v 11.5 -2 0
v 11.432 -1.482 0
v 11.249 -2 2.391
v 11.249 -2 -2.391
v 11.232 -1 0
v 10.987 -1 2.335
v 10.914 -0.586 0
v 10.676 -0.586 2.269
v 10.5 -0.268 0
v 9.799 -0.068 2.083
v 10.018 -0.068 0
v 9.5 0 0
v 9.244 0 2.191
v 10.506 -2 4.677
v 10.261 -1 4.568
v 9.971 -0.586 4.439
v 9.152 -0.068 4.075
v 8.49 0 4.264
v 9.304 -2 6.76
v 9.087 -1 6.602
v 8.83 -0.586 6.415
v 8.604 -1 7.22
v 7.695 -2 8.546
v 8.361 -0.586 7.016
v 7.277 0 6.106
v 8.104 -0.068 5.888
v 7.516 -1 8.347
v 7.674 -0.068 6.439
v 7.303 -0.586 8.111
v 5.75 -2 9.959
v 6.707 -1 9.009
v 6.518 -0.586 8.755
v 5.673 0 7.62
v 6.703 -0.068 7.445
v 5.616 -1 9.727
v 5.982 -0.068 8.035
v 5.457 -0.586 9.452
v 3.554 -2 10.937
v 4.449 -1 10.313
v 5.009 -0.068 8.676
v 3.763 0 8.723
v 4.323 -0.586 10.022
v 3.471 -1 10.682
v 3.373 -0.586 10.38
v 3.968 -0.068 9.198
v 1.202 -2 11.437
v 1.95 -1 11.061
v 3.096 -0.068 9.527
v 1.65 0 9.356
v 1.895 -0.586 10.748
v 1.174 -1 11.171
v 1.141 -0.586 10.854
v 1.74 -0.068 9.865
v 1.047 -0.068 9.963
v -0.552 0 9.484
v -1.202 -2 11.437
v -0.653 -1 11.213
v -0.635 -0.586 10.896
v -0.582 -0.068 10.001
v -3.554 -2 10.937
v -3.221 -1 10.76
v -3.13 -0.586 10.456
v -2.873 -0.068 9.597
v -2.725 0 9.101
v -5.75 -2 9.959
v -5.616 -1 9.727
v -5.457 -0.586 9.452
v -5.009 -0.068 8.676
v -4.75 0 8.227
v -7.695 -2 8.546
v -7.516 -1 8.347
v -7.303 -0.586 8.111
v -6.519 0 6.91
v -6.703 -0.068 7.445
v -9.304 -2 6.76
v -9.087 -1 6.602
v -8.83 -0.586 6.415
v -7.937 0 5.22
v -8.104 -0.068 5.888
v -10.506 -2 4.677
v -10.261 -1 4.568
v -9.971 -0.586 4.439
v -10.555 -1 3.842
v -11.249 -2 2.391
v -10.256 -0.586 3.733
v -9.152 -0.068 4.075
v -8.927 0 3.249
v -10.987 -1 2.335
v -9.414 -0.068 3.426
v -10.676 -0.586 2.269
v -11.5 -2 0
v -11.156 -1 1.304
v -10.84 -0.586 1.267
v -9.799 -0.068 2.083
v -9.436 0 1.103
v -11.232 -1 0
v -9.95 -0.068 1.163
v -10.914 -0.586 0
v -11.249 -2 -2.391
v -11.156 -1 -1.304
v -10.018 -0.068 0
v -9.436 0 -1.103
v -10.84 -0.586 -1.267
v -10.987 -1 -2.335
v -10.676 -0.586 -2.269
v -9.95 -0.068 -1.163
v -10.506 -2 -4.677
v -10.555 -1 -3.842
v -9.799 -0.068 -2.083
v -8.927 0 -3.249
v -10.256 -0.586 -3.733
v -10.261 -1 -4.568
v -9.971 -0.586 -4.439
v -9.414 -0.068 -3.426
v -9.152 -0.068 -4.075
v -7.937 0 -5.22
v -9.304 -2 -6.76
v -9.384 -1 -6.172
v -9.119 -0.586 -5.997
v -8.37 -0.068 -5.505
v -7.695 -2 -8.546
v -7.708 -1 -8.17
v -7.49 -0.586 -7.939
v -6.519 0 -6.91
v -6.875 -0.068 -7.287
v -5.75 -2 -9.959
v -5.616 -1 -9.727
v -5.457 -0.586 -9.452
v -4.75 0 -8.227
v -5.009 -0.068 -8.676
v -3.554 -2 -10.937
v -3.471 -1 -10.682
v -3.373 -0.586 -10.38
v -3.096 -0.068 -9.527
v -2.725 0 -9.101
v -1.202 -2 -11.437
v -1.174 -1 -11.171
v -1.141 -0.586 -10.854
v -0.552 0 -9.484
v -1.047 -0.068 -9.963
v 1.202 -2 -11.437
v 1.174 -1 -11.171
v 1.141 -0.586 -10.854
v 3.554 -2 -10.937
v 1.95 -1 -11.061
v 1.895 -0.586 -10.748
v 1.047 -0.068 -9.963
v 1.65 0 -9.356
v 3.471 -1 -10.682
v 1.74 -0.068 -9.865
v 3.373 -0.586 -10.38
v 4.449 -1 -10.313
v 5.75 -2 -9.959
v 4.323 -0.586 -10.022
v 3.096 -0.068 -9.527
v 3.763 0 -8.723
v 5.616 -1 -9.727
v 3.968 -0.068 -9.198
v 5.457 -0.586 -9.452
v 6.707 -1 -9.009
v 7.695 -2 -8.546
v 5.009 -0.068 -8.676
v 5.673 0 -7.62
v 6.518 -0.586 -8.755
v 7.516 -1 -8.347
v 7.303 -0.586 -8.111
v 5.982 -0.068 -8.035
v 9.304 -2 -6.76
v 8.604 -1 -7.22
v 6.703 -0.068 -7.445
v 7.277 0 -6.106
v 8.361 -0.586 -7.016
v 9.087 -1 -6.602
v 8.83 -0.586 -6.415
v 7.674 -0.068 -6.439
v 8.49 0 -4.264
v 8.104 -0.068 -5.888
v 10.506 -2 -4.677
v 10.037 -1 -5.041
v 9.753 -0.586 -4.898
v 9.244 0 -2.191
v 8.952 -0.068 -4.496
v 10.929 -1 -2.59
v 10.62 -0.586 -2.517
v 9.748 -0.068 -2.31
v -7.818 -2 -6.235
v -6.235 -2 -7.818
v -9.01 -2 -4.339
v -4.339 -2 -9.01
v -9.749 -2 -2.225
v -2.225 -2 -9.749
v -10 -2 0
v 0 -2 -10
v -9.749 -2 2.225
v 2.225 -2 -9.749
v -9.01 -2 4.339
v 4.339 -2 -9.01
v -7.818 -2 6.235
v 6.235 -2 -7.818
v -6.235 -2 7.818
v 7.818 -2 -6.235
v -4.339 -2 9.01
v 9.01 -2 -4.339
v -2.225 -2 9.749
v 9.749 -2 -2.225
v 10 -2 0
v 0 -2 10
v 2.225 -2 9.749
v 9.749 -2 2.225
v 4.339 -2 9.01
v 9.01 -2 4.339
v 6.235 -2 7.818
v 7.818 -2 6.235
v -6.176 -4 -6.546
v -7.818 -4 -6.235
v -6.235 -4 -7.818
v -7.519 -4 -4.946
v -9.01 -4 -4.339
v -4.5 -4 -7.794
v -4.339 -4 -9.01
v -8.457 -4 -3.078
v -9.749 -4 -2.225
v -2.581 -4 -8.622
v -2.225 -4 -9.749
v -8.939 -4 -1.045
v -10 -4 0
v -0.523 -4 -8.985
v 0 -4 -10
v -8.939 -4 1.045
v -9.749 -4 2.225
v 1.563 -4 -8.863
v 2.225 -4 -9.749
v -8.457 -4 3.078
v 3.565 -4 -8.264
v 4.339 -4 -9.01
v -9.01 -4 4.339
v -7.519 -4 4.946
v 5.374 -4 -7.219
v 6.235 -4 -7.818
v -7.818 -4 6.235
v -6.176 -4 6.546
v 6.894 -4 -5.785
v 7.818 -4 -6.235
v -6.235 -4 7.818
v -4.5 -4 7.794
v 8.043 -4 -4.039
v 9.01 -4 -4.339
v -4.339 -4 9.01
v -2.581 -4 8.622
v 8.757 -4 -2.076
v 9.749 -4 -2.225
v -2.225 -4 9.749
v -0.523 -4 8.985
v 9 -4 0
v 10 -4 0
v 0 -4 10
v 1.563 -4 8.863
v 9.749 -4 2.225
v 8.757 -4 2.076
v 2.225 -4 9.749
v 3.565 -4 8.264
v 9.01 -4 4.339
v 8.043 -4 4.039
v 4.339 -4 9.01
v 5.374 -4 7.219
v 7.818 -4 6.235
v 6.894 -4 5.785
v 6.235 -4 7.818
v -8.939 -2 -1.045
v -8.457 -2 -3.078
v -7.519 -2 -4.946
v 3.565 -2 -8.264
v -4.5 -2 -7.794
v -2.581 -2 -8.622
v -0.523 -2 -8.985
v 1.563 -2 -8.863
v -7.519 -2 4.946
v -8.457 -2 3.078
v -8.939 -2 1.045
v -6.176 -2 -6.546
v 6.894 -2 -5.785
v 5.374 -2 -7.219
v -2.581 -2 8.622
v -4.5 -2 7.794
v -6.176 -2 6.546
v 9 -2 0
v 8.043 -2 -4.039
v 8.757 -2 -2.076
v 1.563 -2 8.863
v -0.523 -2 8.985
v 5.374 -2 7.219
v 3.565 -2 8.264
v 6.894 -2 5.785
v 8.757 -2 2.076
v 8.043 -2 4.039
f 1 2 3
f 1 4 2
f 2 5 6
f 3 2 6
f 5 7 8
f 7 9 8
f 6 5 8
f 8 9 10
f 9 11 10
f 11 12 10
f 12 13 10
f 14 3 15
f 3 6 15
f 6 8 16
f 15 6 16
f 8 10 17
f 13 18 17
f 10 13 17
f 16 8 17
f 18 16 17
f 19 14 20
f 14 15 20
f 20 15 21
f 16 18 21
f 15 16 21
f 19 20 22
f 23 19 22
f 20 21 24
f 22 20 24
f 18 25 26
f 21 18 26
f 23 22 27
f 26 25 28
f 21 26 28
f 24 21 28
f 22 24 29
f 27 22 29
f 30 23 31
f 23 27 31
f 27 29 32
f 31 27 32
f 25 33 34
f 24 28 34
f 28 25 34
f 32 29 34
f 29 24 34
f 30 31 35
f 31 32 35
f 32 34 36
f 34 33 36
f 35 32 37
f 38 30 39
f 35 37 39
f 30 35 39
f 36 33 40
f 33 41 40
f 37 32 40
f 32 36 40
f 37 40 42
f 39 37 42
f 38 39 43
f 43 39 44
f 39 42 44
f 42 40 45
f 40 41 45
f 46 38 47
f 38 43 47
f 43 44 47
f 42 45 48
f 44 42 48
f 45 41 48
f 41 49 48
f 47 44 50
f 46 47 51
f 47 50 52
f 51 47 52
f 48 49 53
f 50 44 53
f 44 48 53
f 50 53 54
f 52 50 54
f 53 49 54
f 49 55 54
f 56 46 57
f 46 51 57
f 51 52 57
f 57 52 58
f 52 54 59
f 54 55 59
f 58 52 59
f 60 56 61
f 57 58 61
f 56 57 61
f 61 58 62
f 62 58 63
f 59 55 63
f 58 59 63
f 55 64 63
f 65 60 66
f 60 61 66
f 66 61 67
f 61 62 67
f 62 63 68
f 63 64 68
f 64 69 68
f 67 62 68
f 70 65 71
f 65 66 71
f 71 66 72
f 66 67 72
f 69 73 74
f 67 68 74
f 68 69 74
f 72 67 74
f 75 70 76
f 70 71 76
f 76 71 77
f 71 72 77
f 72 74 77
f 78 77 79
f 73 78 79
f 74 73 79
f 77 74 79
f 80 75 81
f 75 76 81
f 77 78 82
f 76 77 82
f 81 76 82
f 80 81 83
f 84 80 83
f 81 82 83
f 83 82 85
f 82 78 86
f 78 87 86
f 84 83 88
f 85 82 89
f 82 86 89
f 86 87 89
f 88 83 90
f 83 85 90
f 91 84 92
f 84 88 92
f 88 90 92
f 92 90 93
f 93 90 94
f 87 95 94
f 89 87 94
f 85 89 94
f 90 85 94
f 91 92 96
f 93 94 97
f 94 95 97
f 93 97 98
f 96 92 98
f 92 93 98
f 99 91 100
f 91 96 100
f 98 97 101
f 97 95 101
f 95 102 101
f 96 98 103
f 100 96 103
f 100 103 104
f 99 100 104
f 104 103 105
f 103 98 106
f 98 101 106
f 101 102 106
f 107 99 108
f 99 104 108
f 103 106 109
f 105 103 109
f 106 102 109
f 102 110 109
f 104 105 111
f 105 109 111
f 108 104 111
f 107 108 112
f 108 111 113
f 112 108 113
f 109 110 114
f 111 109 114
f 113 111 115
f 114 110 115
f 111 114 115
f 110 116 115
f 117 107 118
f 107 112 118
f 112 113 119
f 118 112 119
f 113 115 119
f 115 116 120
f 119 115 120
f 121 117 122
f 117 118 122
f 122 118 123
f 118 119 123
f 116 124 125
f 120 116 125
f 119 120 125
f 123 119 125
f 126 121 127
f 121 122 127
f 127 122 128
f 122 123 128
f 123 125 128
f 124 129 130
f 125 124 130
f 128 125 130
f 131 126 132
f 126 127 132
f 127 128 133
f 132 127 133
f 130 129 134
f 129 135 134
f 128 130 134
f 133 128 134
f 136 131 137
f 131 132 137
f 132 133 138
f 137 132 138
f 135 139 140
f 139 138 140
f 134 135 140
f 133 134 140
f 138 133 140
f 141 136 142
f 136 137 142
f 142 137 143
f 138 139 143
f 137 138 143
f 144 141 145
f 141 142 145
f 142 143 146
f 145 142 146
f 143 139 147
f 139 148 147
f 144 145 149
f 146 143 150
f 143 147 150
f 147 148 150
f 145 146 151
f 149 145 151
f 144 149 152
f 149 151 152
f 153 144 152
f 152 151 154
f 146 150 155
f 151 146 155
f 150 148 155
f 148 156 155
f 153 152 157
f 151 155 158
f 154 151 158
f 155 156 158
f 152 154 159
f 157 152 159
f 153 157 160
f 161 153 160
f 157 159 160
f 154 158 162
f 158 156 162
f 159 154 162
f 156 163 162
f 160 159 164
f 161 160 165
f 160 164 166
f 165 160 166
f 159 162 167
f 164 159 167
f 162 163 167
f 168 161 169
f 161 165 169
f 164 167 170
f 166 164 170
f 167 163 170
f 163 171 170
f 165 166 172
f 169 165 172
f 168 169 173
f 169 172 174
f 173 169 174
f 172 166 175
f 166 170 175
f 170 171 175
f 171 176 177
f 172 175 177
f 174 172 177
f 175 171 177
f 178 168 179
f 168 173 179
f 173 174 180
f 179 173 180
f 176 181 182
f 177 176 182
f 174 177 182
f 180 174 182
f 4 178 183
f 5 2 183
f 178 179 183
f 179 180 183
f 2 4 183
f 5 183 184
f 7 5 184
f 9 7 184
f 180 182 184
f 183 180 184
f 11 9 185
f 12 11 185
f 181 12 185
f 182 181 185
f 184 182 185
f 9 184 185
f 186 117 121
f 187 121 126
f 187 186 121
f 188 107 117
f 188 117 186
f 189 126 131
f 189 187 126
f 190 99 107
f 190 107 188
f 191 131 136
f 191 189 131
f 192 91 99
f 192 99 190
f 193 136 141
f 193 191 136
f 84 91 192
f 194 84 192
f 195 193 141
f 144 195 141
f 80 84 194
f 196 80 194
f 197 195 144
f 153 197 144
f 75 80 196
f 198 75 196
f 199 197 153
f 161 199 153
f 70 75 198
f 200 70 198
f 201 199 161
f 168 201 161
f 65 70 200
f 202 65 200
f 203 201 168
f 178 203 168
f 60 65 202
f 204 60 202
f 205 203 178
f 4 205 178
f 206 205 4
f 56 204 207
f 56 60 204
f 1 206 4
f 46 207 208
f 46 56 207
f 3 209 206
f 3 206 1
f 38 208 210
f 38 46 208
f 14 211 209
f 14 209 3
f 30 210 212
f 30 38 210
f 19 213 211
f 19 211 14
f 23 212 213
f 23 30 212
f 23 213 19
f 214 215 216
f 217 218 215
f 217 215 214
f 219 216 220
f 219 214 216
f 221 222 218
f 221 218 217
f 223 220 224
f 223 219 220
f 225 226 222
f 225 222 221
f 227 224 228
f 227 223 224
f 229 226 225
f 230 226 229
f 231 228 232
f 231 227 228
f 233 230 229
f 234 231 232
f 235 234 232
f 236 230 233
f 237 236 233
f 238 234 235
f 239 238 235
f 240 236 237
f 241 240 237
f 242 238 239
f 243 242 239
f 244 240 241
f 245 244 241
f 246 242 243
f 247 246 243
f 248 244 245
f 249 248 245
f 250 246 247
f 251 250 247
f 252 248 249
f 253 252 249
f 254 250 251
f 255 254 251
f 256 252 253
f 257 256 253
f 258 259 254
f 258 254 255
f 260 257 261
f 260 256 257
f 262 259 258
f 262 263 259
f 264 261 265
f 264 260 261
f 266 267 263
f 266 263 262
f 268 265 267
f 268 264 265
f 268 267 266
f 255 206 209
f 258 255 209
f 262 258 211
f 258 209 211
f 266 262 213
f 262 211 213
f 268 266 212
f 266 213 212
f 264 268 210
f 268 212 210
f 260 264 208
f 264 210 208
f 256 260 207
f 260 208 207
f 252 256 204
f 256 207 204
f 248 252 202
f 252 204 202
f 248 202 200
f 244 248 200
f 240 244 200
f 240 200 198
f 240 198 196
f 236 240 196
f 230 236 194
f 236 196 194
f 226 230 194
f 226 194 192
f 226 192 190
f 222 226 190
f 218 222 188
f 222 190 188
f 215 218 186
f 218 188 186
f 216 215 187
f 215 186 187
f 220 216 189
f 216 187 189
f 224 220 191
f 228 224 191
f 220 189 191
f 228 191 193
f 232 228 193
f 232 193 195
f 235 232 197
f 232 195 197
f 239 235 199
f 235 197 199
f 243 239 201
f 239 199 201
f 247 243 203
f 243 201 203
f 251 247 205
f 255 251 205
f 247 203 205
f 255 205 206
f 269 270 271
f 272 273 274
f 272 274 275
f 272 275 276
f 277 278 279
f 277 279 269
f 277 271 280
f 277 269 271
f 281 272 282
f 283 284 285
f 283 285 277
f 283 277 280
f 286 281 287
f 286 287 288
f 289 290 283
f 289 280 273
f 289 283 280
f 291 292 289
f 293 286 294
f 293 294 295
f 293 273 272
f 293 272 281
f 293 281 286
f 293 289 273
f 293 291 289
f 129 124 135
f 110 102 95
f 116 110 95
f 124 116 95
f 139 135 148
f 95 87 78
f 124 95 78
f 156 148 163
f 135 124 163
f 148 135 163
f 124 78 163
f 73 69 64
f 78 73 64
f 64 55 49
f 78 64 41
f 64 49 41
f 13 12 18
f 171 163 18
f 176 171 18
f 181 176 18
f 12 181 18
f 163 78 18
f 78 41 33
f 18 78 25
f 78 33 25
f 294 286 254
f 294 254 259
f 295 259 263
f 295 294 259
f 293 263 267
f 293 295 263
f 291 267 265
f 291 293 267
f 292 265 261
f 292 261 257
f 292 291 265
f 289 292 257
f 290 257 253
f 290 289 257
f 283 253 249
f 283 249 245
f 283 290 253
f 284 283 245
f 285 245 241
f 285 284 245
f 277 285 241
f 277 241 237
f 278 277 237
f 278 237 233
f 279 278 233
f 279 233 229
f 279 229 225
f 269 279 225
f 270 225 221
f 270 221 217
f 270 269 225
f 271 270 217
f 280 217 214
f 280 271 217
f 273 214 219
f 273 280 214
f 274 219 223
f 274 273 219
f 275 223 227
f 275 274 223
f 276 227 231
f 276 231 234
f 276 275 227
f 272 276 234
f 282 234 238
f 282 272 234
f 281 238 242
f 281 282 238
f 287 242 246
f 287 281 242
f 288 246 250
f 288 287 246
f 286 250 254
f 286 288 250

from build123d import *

# Parameters (mm, degrees)
F0_R     = 11.5
F1_DEPTH = 2
F2_R     = 10
F2_R_2   = 9
F3_DEPTH = 2
F4_R     = 1.99999


# Not quite as in the source:
# - a fillet or chamfer is up to 0.001 mm smaller than in the source, because OpenCascade refuses the exact size


with BuildPart() as f1:
    # F0 (on Front) → F1 (new body)
    with BuildSketch(Plane.XZ):
        Circle(F0_R)
    extrude(amount=F1_DEPTH)

    # F2 (on face) → F3 (join)
    with BuildSketch(Plane.XZ.offset(2)):
        Circle(F2_R)
        Circle(F2_R_2, mode=Mode.SUBTRACT)
    extrude(amount=F3_DEPTH)

    # F4 (radius 2 in the source; OpenCascade refuses exactly that, so slightly less here)
    f4_edges = [f1.edges().sort_by_distance(p)[0] for p in [
        (-11.5, 0, 0),
    ]]
    fillet(f4_edges, radius=F4_R)


solid = f1.part
